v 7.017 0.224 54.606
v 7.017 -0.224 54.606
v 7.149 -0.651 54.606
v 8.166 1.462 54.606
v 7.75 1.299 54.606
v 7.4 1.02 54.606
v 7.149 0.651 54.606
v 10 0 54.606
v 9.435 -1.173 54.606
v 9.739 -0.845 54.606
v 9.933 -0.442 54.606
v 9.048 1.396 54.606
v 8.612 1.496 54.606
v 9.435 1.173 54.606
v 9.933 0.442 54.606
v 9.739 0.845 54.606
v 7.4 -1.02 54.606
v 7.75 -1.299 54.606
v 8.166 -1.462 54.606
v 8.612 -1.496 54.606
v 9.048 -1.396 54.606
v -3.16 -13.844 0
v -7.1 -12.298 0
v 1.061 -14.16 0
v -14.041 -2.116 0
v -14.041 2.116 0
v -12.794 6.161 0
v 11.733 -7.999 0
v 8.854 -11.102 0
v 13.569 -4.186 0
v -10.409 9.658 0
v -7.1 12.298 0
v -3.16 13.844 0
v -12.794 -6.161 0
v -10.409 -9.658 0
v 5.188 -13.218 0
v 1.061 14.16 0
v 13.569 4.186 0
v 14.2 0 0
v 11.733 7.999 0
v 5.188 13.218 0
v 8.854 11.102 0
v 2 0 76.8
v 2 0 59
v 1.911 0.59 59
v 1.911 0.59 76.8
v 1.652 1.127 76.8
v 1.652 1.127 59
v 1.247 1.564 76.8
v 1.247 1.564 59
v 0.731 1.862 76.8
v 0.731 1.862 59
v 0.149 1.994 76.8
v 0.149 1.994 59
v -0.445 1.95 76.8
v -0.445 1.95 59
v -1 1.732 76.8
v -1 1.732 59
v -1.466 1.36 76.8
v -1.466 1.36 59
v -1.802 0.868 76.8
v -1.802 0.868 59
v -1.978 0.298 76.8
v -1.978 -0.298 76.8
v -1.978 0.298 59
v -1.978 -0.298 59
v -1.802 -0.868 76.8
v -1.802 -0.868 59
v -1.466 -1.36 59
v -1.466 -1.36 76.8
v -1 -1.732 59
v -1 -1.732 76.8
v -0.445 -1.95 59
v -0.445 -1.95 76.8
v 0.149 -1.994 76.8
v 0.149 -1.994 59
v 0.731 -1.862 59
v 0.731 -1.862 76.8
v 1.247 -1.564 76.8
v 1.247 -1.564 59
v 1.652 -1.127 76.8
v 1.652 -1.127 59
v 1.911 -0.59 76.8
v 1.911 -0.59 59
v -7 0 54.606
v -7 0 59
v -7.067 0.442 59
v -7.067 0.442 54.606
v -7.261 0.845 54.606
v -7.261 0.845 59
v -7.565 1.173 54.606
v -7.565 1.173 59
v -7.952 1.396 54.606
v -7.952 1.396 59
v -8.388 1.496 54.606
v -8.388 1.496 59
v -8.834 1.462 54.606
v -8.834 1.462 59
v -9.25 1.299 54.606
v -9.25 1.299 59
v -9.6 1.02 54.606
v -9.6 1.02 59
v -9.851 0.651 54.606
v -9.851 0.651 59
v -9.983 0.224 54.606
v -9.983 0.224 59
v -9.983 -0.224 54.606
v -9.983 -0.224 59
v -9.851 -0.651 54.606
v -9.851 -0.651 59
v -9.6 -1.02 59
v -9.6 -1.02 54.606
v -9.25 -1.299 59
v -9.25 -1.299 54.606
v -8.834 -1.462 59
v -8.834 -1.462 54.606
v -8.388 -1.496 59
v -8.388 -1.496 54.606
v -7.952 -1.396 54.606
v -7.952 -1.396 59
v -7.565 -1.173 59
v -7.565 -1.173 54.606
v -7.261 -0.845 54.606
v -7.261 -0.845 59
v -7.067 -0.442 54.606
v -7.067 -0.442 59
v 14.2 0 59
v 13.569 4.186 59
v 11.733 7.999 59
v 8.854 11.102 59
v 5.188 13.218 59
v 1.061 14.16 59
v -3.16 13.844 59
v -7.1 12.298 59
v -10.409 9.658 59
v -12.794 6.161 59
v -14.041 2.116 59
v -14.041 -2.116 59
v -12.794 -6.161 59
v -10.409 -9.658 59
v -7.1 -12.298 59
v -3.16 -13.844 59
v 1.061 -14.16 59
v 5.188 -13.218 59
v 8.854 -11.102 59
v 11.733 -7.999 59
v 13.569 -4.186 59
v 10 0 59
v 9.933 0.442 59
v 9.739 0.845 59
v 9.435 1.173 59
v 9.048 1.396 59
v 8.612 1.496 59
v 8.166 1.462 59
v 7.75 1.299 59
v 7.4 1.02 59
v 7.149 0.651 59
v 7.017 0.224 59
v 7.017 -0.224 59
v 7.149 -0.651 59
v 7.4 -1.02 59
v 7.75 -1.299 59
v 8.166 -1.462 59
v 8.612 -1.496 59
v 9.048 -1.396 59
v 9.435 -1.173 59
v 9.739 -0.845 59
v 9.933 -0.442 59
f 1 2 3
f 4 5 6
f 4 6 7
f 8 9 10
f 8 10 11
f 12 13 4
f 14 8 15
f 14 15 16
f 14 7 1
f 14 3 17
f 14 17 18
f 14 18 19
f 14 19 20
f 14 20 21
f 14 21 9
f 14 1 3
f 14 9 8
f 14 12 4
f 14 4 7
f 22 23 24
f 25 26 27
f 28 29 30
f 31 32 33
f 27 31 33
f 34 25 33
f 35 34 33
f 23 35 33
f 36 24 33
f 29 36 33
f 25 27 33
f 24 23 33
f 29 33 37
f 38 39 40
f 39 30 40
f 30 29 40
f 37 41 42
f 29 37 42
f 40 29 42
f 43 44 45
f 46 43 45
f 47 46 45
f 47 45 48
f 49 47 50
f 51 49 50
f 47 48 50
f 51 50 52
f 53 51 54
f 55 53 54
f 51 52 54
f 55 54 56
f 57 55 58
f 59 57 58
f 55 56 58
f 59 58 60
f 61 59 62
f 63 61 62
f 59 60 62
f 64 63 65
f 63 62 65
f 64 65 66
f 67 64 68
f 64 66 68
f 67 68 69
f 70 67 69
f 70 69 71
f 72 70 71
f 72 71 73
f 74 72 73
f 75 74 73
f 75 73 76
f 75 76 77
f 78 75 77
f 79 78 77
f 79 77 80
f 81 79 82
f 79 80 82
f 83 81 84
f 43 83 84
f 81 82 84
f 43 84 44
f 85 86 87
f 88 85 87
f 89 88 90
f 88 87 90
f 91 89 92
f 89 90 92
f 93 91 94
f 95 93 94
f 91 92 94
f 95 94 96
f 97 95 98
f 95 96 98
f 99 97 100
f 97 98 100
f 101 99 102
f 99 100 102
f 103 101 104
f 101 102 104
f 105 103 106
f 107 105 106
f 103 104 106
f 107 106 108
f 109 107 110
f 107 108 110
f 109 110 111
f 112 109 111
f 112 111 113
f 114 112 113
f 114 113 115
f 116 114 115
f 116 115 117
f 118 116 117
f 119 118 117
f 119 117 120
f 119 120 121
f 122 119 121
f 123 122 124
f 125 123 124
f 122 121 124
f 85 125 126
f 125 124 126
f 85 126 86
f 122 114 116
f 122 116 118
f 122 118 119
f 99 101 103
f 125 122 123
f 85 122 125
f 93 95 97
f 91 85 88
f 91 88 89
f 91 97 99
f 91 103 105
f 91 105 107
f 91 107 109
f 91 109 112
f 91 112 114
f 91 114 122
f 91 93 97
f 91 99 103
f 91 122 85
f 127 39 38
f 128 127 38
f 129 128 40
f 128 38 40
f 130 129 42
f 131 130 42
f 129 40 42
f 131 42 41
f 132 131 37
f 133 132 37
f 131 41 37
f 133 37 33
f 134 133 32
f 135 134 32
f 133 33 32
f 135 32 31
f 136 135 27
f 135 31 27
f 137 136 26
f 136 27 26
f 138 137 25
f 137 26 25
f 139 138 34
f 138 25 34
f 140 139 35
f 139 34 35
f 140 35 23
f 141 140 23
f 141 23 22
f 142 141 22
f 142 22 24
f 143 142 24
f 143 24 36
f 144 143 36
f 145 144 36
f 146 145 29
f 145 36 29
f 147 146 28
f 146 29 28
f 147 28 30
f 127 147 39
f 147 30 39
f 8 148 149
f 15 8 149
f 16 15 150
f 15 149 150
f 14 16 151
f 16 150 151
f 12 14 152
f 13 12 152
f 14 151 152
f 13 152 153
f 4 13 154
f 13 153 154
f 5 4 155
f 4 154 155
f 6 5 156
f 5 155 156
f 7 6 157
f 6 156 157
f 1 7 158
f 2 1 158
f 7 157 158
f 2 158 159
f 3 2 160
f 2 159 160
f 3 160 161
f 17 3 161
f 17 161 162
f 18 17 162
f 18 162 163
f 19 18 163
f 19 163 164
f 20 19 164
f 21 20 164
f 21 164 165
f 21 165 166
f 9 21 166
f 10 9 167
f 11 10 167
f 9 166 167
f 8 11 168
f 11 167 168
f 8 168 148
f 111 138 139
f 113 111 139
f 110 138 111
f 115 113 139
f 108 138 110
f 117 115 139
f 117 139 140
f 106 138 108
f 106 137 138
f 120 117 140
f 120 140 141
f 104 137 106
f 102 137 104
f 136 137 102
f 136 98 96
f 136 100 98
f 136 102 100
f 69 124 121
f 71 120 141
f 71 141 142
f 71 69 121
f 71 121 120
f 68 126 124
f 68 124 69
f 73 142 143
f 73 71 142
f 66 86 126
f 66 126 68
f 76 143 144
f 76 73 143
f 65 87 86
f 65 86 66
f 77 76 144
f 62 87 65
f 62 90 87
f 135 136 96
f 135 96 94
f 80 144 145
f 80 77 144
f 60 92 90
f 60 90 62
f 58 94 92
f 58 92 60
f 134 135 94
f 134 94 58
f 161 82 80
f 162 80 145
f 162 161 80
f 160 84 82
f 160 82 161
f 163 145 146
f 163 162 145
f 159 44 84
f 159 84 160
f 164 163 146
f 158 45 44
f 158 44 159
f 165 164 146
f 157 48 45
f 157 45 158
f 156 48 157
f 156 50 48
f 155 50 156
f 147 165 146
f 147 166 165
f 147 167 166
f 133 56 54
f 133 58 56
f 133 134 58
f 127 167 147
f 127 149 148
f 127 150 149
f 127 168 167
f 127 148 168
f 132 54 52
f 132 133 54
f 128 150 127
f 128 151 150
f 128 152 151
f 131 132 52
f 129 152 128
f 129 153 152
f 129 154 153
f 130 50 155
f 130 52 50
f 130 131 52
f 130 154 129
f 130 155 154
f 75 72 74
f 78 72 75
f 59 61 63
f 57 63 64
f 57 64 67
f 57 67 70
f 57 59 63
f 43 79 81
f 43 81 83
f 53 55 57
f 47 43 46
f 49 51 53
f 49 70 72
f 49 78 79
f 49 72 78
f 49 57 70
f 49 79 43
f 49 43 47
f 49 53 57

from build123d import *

# Parameters (mm, degrees)
SKETCH1_R           = 14.2
BOSS_EXTRUDE1_DEPTH = 59
SKETCH2_R           = 2
BOSS_EXTRUDE2_DEPTH = 17.8
SKETCH3_R           = 1.5
CUT_EXTRUDE1_DEPTH  = 4.3942


with BuildPart() as part:
    # Sketch1 → Boss-Extrude1 (new body)
    with BuildSketch(Plane.XY):
        Circle(SKETCH1_R)
    extrude(amount=BOSS_EXTRUDE1_DEPTH)

    # Sketch2 → Boss-Extrude2 (add)
    with BuildSketch(Plane.XY.offset(59)):
        Circle(SKETCH2_R)
    extrude(amount=BOSS_EXTRUDE2_DEPTH)

    # Sketch3 → Cut-Extrude1 (cut)
    with BuildSketch(Plane.XY.offset(59)):
        with Locations((-8.5, 0)):
            Circle(SKETCH3_R)
        with Locations((8.5, 0)):
            Circle(SKETCH3_R)
    extrude(amount=-CUT_EXTRUDE1_DEPTH, mode=Mode.SUBTRACT)


solid = part.part
